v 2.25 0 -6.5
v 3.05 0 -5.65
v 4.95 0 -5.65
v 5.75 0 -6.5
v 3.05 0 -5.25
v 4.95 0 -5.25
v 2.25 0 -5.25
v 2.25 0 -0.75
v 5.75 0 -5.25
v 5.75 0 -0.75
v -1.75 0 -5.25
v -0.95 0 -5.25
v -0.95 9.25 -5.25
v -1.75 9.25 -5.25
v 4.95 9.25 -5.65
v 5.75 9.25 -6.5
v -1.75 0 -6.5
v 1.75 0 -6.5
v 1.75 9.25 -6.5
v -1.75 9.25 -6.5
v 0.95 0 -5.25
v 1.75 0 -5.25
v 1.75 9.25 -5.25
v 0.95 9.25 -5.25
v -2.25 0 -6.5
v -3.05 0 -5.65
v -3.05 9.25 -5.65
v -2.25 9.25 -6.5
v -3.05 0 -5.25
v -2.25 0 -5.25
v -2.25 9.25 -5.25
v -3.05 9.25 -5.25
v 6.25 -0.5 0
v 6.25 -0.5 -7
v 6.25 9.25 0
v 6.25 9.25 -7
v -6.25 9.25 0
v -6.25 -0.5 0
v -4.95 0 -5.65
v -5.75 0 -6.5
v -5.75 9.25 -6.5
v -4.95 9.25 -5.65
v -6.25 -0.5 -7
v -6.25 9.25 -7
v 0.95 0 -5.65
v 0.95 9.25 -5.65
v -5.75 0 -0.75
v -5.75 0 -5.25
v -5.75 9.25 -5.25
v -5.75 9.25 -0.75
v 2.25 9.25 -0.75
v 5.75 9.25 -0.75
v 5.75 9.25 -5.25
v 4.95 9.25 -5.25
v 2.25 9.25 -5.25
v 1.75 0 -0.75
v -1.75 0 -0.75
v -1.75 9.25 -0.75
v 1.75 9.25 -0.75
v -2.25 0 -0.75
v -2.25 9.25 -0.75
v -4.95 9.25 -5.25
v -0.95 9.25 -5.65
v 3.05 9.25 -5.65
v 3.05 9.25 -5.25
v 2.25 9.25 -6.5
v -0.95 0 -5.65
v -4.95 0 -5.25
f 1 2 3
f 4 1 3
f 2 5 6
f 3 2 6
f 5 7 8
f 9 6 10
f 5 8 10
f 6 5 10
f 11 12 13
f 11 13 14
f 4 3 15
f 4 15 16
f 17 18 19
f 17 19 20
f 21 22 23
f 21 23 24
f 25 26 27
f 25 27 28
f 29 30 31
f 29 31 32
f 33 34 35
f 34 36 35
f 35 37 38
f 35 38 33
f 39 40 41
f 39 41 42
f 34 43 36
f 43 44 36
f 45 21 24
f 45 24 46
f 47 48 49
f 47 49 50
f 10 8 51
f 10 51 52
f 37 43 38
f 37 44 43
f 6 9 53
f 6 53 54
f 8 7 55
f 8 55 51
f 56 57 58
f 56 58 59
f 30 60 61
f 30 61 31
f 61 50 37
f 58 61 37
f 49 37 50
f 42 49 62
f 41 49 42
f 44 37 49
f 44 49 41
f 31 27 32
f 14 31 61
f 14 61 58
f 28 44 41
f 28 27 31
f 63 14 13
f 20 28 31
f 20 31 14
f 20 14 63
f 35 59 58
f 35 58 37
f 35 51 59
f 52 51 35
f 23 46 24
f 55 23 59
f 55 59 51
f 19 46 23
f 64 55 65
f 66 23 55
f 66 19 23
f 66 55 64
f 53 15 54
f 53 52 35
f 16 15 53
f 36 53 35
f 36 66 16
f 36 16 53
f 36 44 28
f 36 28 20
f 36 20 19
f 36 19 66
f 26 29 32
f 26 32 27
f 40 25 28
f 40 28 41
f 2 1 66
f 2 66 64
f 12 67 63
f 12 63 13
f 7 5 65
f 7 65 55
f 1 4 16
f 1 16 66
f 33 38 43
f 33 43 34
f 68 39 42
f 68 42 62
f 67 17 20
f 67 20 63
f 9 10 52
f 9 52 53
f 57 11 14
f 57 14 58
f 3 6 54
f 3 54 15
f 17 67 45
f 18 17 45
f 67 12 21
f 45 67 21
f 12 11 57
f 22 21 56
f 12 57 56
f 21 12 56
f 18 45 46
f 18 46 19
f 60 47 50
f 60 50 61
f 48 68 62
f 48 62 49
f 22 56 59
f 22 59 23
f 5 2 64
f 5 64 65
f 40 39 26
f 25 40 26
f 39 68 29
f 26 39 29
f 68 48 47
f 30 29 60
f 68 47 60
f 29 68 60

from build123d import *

# Parameters (mm, degrees)
SKETCH1_W           = 12.5
SKETCH1_H           = 7
BOSS_EXTRUDE1_DEPTH = 9.25
SKETCH2_W           = 12.5
SKETCH2_H           = 7
BOSS_EXTRUDE2_DEPTH = 0.5


with BuildPart() as part:
    # Sketch1 → Boss-Extrude1 (new body)
    with BuildSketch(Plane(origin=(0, 0, 0), x_dir=(1, 0, 0), z_dir=(0, 1, 0))):
        with Locations((0, 3.5)):
            Rectangle(SKETCH1_W, SKETCH1_H)
        Polygon((-5.75, 5.25), (-5.75, 0.75), (-2.25, 0.75), (-2.25, 5.25), (-3.05, 5.25), (-3.05, 5.65), (-2.25, 6.5), (-5.75, 6.5), (-4.95, 5.65), (-4.95, 5.25), align=None, mode=Mode.SUBTRACT)
        Polygon((-1.75, 5.25), (-1.75, 0.75), (1.75, 0.75), (1.75, 5.25), (0.95, 5.25), (0.95, 5.65), (1.75, 6.5), (-1.75, 6.5), (-0.95, 5.65), (-0.95, 5.25), align=None, mode=Mode.SUBTRACT)
        Polygon((2.25, 5.25), (2.25, 0.75), (5.75, 0.75), (5.75, 5.25), (4.95, 5.25), (4.95, 5.65), (5.75, 6.5), (2.25, 6.5), (3.05, 5.65), (3.05, 5.25), align=None, mode=Mode.SUBTRACT)
    extrude(amount=BOSS_EXTRUDE1_DEPTH)

    # Sketch2 → Boss-Extrude2 (add)
    with BuildSketch(Plane.XZ):
        with Locations((0, -3.5)):
            Rectangle(SKETCH2_W, SKETCH2_H)
    extrude(amount=BOSS_EXTRUDE2_DEPTH)


solid = part.part
